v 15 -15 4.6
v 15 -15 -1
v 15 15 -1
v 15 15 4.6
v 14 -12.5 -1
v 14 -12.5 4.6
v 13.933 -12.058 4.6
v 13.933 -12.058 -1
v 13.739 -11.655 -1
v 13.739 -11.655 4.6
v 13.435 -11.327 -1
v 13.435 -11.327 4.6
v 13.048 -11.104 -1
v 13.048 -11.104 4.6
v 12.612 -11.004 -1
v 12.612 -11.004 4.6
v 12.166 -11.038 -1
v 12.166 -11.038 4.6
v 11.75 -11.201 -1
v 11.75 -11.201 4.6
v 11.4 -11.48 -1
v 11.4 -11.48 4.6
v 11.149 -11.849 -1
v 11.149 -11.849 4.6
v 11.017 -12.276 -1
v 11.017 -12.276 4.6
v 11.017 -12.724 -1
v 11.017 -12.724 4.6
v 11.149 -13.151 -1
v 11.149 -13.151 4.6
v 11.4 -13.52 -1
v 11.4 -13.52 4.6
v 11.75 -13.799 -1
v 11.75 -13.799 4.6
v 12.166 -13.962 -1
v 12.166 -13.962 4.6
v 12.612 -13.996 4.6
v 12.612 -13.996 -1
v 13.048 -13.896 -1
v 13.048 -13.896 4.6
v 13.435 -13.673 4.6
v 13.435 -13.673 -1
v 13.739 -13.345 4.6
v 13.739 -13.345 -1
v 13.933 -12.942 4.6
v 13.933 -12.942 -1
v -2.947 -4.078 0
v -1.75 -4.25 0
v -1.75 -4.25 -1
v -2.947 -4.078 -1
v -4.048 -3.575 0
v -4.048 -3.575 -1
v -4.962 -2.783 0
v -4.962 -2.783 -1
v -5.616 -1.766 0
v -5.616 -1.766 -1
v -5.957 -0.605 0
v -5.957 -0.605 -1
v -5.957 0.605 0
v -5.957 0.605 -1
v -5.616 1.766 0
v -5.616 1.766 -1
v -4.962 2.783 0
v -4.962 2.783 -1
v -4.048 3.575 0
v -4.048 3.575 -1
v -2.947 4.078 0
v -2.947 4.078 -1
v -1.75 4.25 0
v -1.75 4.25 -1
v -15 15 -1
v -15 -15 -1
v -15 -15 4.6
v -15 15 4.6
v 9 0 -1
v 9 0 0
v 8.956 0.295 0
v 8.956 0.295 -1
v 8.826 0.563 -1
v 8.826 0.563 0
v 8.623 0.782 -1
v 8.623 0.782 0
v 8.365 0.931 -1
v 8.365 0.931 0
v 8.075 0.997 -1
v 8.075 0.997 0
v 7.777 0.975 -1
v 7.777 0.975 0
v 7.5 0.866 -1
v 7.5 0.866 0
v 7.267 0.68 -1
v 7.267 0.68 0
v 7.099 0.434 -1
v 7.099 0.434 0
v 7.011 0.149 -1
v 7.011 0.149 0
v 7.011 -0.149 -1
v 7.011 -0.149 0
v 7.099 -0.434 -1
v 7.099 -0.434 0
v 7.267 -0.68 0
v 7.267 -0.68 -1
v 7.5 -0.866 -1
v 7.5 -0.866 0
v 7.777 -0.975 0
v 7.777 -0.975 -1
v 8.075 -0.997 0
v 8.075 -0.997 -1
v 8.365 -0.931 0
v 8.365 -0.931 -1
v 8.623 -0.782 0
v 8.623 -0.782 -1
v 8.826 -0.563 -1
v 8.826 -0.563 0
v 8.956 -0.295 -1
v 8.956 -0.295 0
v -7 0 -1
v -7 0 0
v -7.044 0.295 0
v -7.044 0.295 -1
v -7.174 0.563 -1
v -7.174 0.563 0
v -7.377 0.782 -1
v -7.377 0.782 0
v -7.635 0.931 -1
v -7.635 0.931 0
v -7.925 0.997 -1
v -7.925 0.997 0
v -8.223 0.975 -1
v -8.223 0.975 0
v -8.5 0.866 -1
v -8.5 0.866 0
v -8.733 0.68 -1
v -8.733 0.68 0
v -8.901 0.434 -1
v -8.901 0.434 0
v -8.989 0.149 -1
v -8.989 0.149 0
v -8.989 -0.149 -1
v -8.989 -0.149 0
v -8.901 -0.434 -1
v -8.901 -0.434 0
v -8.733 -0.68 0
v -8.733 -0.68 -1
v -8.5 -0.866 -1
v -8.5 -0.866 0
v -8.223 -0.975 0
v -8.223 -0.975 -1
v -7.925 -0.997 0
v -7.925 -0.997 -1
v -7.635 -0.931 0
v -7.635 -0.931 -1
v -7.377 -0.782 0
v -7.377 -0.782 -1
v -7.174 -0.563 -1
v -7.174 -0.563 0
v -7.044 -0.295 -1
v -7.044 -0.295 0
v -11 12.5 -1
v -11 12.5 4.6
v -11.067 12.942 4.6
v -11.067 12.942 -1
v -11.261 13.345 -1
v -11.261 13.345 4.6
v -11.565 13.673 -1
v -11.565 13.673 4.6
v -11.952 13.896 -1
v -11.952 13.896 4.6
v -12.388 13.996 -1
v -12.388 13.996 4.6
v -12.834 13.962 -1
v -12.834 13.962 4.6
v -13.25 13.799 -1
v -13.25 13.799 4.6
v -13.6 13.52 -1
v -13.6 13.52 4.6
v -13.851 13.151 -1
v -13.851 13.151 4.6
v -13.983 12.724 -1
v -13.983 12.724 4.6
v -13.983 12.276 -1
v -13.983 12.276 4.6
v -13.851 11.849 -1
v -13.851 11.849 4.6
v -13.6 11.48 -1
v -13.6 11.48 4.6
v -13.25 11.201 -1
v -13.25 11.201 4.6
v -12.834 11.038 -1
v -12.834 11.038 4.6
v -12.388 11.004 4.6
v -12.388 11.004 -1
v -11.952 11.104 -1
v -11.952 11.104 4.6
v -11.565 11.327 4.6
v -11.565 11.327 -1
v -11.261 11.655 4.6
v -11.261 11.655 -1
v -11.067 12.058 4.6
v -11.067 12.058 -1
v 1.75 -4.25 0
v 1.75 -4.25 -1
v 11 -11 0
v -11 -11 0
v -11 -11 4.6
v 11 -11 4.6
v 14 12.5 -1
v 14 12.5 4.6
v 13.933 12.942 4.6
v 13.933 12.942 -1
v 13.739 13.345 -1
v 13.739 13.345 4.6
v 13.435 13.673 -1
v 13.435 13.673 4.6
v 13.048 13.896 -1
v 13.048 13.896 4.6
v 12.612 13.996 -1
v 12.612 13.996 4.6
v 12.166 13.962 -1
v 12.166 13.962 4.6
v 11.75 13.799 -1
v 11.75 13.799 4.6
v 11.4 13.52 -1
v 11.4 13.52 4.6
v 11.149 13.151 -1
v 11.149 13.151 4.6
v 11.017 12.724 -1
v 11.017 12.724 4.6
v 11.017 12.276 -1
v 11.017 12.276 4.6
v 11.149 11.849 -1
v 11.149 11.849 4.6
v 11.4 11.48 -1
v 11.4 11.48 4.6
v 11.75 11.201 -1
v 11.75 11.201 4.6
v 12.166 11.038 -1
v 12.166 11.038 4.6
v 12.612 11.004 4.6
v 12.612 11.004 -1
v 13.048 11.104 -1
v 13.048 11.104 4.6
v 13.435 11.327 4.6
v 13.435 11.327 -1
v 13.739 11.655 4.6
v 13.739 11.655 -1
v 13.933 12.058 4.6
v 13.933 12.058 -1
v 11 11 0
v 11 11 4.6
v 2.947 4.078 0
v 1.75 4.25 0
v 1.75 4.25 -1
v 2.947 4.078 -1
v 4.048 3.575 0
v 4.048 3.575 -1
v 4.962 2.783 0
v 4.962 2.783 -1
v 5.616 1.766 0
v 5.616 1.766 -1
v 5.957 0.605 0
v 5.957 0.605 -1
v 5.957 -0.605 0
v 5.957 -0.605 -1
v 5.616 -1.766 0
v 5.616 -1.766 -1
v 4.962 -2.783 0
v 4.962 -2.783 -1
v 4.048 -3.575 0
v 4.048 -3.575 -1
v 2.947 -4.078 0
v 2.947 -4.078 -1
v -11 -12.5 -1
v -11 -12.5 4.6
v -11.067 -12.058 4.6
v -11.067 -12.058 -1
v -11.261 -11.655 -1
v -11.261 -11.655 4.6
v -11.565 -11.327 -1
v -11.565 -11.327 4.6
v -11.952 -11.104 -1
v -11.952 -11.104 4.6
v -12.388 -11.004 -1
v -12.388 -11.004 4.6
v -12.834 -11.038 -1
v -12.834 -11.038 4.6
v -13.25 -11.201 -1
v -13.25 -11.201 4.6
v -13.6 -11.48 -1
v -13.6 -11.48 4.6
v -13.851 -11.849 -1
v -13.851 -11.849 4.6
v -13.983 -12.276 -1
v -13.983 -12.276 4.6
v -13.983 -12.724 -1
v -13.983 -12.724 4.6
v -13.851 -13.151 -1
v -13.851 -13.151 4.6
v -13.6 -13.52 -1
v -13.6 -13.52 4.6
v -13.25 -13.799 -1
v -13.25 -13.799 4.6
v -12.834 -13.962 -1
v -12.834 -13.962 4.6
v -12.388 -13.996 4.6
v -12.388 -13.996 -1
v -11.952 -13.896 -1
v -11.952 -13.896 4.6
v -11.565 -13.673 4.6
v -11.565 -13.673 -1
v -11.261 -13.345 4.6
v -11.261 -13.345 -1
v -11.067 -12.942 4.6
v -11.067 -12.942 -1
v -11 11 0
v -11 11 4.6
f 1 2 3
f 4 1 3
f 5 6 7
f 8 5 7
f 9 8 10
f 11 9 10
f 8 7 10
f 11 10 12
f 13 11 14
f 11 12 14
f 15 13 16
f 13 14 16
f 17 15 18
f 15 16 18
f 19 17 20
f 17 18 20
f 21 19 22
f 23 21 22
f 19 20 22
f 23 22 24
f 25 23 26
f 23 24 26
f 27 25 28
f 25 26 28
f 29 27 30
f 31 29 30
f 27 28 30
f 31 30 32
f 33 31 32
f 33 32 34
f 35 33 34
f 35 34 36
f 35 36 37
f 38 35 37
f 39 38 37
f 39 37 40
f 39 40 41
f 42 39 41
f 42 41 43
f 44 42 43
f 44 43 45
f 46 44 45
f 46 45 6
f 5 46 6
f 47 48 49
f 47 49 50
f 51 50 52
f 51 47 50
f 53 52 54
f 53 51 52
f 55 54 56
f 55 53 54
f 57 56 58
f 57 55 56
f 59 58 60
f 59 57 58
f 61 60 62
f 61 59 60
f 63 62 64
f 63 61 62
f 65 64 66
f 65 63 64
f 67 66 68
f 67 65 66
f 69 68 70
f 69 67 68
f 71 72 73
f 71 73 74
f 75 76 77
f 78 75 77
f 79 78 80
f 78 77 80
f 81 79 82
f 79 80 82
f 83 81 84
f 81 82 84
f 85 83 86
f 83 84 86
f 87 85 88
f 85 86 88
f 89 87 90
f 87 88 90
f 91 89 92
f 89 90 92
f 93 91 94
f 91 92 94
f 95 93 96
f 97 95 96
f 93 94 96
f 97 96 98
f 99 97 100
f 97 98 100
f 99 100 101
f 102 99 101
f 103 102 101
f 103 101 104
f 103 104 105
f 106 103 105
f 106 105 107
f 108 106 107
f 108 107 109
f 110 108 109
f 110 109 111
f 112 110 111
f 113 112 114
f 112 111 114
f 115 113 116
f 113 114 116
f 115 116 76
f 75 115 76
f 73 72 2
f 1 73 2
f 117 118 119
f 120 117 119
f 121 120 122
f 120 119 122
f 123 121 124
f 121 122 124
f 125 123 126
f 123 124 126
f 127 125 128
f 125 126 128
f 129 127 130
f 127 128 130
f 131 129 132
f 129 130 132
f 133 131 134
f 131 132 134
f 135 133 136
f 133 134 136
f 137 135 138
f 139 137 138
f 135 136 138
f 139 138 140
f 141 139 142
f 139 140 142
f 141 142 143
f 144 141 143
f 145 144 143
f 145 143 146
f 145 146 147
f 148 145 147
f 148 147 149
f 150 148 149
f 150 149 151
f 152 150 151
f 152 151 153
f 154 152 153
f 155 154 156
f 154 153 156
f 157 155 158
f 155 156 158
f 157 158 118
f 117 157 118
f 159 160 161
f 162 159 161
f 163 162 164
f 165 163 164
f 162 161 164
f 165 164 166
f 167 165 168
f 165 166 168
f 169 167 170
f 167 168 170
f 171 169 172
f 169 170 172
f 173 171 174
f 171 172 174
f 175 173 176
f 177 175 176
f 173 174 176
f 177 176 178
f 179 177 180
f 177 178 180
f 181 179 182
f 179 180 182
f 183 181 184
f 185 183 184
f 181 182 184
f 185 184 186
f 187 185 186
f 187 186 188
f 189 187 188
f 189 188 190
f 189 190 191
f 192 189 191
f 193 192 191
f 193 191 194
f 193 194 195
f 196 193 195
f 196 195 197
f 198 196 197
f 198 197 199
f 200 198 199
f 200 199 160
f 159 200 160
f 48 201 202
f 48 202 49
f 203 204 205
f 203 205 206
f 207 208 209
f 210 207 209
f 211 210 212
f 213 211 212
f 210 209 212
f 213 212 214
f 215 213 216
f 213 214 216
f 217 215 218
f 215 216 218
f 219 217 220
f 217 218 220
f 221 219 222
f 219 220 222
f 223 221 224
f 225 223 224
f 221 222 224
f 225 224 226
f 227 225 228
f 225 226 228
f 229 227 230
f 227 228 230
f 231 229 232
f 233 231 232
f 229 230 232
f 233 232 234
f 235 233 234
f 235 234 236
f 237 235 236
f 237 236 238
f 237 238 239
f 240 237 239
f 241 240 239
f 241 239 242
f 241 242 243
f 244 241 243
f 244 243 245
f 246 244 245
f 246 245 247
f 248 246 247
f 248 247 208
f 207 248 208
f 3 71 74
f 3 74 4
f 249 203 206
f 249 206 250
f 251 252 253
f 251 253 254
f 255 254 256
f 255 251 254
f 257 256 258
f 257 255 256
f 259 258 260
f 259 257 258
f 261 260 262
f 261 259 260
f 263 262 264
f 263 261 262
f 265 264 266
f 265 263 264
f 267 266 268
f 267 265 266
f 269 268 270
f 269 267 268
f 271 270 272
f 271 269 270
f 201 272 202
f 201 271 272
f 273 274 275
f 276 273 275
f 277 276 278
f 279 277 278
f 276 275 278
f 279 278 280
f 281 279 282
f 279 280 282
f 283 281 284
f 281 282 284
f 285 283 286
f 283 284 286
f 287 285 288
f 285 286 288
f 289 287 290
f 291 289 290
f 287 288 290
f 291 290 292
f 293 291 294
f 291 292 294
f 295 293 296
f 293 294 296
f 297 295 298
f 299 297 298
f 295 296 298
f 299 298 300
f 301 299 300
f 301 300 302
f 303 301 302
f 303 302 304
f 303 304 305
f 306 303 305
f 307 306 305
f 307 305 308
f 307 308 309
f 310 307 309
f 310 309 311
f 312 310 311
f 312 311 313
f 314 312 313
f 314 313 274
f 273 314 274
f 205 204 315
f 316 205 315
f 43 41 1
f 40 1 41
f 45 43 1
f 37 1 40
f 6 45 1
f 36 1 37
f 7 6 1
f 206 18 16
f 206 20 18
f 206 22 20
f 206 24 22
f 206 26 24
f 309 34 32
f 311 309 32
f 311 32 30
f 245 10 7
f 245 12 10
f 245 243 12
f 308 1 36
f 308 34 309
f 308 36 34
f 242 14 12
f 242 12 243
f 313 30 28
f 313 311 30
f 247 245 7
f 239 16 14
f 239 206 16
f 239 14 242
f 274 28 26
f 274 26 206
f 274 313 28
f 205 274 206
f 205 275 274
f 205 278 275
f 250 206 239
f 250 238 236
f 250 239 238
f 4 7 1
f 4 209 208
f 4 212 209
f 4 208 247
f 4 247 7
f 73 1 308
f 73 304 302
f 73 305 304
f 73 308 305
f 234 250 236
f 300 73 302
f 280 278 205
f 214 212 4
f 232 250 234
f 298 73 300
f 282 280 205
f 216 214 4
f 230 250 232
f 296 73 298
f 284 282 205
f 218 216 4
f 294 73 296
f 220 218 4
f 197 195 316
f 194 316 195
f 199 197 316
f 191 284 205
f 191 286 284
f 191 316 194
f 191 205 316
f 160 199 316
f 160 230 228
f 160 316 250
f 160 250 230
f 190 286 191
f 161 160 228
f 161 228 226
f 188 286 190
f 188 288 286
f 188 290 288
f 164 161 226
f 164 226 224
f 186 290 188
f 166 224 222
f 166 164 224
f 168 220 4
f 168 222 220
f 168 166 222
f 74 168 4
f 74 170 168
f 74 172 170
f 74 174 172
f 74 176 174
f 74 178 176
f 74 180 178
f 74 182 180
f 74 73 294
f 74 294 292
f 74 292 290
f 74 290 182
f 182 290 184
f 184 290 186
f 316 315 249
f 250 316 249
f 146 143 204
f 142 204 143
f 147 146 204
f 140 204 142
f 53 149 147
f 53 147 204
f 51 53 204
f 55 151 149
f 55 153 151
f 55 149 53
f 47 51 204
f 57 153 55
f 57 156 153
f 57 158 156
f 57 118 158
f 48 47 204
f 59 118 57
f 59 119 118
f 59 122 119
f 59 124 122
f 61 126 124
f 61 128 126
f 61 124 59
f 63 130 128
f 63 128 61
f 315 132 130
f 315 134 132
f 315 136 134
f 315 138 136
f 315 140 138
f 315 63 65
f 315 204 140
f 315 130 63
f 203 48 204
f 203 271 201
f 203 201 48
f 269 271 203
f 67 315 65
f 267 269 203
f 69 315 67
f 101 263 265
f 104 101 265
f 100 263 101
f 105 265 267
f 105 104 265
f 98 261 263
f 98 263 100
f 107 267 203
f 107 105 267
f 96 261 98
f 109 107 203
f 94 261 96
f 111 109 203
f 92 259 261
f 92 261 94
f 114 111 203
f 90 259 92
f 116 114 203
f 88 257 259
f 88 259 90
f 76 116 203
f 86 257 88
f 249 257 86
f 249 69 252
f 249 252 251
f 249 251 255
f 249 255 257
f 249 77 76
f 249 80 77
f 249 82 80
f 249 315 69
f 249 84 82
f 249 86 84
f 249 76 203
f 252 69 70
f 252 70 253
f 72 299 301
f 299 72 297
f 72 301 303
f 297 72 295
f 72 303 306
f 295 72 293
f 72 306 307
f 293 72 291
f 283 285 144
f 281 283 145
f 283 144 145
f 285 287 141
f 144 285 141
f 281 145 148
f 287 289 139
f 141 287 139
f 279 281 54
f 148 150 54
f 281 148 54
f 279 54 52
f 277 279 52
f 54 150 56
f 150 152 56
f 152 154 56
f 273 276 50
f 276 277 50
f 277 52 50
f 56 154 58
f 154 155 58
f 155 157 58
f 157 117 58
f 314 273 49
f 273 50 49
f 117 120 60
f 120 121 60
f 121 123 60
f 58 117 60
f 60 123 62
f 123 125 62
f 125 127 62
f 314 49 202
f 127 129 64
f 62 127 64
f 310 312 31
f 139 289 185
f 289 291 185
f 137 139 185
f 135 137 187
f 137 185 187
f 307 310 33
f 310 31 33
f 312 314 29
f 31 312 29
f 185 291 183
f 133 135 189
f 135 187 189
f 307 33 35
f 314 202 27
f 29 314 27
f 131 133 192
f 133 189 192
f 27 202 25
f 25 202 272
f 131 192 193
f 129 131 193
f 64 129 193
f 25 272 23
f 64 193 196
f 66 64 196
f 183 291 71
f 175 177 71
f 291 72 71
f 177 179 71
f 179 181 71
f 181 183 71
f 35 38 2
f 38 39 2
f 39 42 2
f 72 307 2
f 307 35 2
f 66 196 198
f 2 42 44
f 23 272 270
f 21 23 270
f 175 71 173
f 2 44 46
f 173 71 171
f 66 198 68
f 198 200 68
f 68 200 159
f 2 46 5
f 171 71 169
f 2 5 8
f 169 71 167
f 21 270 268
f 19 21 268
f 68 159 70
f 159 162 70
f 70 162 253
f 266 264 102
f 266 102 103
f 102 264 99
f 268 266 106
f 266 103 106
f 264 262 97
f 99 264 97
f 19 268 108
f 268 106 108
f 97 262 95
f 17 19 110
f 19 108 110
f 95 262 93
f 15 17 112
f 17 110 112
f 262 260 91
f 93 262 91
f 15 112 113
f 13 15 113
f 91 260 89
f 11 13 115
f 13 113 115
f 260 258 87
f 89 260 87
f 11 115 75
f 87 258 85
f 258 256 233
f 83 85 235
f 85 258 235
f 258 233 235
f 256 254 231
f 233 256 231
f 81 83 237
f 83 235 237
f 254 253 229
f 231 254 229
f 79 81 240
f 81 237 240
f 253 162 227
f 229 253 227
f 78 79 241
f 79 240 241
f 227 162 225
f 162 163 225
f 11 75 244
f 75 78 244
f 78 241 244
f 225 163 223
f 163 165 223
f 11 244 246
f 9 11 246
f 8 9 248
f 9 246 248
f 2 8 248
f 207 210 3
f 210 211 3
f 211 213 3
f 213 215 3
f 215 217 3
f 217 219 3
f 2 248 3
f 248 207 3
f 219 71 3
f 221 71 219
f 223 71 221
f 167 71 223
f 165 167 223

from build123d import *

# Parameters (mm, degrees)
CROQUIS1_W              = 30
CROQUIS1_H              = 30
CROQUIS1_R              = 1
SALIENTE_EXTRUIR2_DEPTH = 1
CROQUIS2_W              = 30
CROQUIS2_H              = 30
CROQUIS2_W_2            = 22
CROQUIS2_H_2            = 22
SALIENTE_EXTRUIR3_DEPTH = 10
CROQUIS4_R              = 1.5
CORTAR_EXTRUIR2_DEPTH   = 44
CROQUIS5_W              = 5.4
CROQUIS5_H              = 30
CORTAR_EXTRUIR3_DEPTH   = 46


with BuildPart() as part:
    # Croquis1 → Saliente-Extruir2 (new body)
    with BuildSketch(Plane.XY):
        Rectangle(CROQUIS1_W, CROQUIS1_H)
        with Locations((-8, 0)):
            Circle(CROQUIS1_R, mode=Mode.SUBTRACT)
        with Locations((8, 0)):
            Circle(CROQUIS1_R, mode=Mode.SUBTRACT)
        with BuildLine():
            Line((-1.75, 4.25), (1.75, 4.25))
            ThreePointArc((1.75, 4.25), (6, 0), (1.75, -4.25))
            Line((1.75, -4.25), (-1.75, -4.25))
            ThreePointArc((-1.75, -4.25), (-6, 0), (-1.75, 4.25))
        make_face(mode=Mode.SUBTRACT)
    extrude(amount=-SALIENTE_EXTRUIR2_DEPTH)

    # Croquis2 → Saliente-Extruir3 (add)
    with BuildSketch(Plane.XY):
        Rectangle(CROQUIS2_W, CROQUIS2_H)
        Rectangle(CROQUIS2_W_2, CROQUIS2_H_2, mode=Mode.SUBTRACT)
    extrude(amount=SALIENTE_EXTRUIR3_DEPTH)

    # Croquis4 → Cortar-Extruir2 (cut)
    with BuildSketch(Plane.XY.offset(10)):
        with Locations((-12.5, 12.5)):
            Circle(CROQUIS4_R)
        with Locations((12.5, 12.5)):
            Circle(CROQUIS4_R)
        with Locations((12.5, -12.5)):
            Circle(CROQUIS4_R)
        with Locations((-12.5, -12.5)):
            Circle(CROQUIS4_R)
    extrude(amount=-CORTAR_EXTRUIR2_DEPTH, mode=Mode.SUBTRACT)

    # Croquis5 → Cortar-Extruir3 (cut)
    with BuildSketch(Plane.ZY.offset(15)):
        with Locations((7.3, 0)):
            Rectangle(CROQUIS5_W, CROQUIS5_H)
    extrude(amount=-CORTAR_EXTRUIR3_DEPTH, mode=Mode.SUBTRACT)


solid = part.part
